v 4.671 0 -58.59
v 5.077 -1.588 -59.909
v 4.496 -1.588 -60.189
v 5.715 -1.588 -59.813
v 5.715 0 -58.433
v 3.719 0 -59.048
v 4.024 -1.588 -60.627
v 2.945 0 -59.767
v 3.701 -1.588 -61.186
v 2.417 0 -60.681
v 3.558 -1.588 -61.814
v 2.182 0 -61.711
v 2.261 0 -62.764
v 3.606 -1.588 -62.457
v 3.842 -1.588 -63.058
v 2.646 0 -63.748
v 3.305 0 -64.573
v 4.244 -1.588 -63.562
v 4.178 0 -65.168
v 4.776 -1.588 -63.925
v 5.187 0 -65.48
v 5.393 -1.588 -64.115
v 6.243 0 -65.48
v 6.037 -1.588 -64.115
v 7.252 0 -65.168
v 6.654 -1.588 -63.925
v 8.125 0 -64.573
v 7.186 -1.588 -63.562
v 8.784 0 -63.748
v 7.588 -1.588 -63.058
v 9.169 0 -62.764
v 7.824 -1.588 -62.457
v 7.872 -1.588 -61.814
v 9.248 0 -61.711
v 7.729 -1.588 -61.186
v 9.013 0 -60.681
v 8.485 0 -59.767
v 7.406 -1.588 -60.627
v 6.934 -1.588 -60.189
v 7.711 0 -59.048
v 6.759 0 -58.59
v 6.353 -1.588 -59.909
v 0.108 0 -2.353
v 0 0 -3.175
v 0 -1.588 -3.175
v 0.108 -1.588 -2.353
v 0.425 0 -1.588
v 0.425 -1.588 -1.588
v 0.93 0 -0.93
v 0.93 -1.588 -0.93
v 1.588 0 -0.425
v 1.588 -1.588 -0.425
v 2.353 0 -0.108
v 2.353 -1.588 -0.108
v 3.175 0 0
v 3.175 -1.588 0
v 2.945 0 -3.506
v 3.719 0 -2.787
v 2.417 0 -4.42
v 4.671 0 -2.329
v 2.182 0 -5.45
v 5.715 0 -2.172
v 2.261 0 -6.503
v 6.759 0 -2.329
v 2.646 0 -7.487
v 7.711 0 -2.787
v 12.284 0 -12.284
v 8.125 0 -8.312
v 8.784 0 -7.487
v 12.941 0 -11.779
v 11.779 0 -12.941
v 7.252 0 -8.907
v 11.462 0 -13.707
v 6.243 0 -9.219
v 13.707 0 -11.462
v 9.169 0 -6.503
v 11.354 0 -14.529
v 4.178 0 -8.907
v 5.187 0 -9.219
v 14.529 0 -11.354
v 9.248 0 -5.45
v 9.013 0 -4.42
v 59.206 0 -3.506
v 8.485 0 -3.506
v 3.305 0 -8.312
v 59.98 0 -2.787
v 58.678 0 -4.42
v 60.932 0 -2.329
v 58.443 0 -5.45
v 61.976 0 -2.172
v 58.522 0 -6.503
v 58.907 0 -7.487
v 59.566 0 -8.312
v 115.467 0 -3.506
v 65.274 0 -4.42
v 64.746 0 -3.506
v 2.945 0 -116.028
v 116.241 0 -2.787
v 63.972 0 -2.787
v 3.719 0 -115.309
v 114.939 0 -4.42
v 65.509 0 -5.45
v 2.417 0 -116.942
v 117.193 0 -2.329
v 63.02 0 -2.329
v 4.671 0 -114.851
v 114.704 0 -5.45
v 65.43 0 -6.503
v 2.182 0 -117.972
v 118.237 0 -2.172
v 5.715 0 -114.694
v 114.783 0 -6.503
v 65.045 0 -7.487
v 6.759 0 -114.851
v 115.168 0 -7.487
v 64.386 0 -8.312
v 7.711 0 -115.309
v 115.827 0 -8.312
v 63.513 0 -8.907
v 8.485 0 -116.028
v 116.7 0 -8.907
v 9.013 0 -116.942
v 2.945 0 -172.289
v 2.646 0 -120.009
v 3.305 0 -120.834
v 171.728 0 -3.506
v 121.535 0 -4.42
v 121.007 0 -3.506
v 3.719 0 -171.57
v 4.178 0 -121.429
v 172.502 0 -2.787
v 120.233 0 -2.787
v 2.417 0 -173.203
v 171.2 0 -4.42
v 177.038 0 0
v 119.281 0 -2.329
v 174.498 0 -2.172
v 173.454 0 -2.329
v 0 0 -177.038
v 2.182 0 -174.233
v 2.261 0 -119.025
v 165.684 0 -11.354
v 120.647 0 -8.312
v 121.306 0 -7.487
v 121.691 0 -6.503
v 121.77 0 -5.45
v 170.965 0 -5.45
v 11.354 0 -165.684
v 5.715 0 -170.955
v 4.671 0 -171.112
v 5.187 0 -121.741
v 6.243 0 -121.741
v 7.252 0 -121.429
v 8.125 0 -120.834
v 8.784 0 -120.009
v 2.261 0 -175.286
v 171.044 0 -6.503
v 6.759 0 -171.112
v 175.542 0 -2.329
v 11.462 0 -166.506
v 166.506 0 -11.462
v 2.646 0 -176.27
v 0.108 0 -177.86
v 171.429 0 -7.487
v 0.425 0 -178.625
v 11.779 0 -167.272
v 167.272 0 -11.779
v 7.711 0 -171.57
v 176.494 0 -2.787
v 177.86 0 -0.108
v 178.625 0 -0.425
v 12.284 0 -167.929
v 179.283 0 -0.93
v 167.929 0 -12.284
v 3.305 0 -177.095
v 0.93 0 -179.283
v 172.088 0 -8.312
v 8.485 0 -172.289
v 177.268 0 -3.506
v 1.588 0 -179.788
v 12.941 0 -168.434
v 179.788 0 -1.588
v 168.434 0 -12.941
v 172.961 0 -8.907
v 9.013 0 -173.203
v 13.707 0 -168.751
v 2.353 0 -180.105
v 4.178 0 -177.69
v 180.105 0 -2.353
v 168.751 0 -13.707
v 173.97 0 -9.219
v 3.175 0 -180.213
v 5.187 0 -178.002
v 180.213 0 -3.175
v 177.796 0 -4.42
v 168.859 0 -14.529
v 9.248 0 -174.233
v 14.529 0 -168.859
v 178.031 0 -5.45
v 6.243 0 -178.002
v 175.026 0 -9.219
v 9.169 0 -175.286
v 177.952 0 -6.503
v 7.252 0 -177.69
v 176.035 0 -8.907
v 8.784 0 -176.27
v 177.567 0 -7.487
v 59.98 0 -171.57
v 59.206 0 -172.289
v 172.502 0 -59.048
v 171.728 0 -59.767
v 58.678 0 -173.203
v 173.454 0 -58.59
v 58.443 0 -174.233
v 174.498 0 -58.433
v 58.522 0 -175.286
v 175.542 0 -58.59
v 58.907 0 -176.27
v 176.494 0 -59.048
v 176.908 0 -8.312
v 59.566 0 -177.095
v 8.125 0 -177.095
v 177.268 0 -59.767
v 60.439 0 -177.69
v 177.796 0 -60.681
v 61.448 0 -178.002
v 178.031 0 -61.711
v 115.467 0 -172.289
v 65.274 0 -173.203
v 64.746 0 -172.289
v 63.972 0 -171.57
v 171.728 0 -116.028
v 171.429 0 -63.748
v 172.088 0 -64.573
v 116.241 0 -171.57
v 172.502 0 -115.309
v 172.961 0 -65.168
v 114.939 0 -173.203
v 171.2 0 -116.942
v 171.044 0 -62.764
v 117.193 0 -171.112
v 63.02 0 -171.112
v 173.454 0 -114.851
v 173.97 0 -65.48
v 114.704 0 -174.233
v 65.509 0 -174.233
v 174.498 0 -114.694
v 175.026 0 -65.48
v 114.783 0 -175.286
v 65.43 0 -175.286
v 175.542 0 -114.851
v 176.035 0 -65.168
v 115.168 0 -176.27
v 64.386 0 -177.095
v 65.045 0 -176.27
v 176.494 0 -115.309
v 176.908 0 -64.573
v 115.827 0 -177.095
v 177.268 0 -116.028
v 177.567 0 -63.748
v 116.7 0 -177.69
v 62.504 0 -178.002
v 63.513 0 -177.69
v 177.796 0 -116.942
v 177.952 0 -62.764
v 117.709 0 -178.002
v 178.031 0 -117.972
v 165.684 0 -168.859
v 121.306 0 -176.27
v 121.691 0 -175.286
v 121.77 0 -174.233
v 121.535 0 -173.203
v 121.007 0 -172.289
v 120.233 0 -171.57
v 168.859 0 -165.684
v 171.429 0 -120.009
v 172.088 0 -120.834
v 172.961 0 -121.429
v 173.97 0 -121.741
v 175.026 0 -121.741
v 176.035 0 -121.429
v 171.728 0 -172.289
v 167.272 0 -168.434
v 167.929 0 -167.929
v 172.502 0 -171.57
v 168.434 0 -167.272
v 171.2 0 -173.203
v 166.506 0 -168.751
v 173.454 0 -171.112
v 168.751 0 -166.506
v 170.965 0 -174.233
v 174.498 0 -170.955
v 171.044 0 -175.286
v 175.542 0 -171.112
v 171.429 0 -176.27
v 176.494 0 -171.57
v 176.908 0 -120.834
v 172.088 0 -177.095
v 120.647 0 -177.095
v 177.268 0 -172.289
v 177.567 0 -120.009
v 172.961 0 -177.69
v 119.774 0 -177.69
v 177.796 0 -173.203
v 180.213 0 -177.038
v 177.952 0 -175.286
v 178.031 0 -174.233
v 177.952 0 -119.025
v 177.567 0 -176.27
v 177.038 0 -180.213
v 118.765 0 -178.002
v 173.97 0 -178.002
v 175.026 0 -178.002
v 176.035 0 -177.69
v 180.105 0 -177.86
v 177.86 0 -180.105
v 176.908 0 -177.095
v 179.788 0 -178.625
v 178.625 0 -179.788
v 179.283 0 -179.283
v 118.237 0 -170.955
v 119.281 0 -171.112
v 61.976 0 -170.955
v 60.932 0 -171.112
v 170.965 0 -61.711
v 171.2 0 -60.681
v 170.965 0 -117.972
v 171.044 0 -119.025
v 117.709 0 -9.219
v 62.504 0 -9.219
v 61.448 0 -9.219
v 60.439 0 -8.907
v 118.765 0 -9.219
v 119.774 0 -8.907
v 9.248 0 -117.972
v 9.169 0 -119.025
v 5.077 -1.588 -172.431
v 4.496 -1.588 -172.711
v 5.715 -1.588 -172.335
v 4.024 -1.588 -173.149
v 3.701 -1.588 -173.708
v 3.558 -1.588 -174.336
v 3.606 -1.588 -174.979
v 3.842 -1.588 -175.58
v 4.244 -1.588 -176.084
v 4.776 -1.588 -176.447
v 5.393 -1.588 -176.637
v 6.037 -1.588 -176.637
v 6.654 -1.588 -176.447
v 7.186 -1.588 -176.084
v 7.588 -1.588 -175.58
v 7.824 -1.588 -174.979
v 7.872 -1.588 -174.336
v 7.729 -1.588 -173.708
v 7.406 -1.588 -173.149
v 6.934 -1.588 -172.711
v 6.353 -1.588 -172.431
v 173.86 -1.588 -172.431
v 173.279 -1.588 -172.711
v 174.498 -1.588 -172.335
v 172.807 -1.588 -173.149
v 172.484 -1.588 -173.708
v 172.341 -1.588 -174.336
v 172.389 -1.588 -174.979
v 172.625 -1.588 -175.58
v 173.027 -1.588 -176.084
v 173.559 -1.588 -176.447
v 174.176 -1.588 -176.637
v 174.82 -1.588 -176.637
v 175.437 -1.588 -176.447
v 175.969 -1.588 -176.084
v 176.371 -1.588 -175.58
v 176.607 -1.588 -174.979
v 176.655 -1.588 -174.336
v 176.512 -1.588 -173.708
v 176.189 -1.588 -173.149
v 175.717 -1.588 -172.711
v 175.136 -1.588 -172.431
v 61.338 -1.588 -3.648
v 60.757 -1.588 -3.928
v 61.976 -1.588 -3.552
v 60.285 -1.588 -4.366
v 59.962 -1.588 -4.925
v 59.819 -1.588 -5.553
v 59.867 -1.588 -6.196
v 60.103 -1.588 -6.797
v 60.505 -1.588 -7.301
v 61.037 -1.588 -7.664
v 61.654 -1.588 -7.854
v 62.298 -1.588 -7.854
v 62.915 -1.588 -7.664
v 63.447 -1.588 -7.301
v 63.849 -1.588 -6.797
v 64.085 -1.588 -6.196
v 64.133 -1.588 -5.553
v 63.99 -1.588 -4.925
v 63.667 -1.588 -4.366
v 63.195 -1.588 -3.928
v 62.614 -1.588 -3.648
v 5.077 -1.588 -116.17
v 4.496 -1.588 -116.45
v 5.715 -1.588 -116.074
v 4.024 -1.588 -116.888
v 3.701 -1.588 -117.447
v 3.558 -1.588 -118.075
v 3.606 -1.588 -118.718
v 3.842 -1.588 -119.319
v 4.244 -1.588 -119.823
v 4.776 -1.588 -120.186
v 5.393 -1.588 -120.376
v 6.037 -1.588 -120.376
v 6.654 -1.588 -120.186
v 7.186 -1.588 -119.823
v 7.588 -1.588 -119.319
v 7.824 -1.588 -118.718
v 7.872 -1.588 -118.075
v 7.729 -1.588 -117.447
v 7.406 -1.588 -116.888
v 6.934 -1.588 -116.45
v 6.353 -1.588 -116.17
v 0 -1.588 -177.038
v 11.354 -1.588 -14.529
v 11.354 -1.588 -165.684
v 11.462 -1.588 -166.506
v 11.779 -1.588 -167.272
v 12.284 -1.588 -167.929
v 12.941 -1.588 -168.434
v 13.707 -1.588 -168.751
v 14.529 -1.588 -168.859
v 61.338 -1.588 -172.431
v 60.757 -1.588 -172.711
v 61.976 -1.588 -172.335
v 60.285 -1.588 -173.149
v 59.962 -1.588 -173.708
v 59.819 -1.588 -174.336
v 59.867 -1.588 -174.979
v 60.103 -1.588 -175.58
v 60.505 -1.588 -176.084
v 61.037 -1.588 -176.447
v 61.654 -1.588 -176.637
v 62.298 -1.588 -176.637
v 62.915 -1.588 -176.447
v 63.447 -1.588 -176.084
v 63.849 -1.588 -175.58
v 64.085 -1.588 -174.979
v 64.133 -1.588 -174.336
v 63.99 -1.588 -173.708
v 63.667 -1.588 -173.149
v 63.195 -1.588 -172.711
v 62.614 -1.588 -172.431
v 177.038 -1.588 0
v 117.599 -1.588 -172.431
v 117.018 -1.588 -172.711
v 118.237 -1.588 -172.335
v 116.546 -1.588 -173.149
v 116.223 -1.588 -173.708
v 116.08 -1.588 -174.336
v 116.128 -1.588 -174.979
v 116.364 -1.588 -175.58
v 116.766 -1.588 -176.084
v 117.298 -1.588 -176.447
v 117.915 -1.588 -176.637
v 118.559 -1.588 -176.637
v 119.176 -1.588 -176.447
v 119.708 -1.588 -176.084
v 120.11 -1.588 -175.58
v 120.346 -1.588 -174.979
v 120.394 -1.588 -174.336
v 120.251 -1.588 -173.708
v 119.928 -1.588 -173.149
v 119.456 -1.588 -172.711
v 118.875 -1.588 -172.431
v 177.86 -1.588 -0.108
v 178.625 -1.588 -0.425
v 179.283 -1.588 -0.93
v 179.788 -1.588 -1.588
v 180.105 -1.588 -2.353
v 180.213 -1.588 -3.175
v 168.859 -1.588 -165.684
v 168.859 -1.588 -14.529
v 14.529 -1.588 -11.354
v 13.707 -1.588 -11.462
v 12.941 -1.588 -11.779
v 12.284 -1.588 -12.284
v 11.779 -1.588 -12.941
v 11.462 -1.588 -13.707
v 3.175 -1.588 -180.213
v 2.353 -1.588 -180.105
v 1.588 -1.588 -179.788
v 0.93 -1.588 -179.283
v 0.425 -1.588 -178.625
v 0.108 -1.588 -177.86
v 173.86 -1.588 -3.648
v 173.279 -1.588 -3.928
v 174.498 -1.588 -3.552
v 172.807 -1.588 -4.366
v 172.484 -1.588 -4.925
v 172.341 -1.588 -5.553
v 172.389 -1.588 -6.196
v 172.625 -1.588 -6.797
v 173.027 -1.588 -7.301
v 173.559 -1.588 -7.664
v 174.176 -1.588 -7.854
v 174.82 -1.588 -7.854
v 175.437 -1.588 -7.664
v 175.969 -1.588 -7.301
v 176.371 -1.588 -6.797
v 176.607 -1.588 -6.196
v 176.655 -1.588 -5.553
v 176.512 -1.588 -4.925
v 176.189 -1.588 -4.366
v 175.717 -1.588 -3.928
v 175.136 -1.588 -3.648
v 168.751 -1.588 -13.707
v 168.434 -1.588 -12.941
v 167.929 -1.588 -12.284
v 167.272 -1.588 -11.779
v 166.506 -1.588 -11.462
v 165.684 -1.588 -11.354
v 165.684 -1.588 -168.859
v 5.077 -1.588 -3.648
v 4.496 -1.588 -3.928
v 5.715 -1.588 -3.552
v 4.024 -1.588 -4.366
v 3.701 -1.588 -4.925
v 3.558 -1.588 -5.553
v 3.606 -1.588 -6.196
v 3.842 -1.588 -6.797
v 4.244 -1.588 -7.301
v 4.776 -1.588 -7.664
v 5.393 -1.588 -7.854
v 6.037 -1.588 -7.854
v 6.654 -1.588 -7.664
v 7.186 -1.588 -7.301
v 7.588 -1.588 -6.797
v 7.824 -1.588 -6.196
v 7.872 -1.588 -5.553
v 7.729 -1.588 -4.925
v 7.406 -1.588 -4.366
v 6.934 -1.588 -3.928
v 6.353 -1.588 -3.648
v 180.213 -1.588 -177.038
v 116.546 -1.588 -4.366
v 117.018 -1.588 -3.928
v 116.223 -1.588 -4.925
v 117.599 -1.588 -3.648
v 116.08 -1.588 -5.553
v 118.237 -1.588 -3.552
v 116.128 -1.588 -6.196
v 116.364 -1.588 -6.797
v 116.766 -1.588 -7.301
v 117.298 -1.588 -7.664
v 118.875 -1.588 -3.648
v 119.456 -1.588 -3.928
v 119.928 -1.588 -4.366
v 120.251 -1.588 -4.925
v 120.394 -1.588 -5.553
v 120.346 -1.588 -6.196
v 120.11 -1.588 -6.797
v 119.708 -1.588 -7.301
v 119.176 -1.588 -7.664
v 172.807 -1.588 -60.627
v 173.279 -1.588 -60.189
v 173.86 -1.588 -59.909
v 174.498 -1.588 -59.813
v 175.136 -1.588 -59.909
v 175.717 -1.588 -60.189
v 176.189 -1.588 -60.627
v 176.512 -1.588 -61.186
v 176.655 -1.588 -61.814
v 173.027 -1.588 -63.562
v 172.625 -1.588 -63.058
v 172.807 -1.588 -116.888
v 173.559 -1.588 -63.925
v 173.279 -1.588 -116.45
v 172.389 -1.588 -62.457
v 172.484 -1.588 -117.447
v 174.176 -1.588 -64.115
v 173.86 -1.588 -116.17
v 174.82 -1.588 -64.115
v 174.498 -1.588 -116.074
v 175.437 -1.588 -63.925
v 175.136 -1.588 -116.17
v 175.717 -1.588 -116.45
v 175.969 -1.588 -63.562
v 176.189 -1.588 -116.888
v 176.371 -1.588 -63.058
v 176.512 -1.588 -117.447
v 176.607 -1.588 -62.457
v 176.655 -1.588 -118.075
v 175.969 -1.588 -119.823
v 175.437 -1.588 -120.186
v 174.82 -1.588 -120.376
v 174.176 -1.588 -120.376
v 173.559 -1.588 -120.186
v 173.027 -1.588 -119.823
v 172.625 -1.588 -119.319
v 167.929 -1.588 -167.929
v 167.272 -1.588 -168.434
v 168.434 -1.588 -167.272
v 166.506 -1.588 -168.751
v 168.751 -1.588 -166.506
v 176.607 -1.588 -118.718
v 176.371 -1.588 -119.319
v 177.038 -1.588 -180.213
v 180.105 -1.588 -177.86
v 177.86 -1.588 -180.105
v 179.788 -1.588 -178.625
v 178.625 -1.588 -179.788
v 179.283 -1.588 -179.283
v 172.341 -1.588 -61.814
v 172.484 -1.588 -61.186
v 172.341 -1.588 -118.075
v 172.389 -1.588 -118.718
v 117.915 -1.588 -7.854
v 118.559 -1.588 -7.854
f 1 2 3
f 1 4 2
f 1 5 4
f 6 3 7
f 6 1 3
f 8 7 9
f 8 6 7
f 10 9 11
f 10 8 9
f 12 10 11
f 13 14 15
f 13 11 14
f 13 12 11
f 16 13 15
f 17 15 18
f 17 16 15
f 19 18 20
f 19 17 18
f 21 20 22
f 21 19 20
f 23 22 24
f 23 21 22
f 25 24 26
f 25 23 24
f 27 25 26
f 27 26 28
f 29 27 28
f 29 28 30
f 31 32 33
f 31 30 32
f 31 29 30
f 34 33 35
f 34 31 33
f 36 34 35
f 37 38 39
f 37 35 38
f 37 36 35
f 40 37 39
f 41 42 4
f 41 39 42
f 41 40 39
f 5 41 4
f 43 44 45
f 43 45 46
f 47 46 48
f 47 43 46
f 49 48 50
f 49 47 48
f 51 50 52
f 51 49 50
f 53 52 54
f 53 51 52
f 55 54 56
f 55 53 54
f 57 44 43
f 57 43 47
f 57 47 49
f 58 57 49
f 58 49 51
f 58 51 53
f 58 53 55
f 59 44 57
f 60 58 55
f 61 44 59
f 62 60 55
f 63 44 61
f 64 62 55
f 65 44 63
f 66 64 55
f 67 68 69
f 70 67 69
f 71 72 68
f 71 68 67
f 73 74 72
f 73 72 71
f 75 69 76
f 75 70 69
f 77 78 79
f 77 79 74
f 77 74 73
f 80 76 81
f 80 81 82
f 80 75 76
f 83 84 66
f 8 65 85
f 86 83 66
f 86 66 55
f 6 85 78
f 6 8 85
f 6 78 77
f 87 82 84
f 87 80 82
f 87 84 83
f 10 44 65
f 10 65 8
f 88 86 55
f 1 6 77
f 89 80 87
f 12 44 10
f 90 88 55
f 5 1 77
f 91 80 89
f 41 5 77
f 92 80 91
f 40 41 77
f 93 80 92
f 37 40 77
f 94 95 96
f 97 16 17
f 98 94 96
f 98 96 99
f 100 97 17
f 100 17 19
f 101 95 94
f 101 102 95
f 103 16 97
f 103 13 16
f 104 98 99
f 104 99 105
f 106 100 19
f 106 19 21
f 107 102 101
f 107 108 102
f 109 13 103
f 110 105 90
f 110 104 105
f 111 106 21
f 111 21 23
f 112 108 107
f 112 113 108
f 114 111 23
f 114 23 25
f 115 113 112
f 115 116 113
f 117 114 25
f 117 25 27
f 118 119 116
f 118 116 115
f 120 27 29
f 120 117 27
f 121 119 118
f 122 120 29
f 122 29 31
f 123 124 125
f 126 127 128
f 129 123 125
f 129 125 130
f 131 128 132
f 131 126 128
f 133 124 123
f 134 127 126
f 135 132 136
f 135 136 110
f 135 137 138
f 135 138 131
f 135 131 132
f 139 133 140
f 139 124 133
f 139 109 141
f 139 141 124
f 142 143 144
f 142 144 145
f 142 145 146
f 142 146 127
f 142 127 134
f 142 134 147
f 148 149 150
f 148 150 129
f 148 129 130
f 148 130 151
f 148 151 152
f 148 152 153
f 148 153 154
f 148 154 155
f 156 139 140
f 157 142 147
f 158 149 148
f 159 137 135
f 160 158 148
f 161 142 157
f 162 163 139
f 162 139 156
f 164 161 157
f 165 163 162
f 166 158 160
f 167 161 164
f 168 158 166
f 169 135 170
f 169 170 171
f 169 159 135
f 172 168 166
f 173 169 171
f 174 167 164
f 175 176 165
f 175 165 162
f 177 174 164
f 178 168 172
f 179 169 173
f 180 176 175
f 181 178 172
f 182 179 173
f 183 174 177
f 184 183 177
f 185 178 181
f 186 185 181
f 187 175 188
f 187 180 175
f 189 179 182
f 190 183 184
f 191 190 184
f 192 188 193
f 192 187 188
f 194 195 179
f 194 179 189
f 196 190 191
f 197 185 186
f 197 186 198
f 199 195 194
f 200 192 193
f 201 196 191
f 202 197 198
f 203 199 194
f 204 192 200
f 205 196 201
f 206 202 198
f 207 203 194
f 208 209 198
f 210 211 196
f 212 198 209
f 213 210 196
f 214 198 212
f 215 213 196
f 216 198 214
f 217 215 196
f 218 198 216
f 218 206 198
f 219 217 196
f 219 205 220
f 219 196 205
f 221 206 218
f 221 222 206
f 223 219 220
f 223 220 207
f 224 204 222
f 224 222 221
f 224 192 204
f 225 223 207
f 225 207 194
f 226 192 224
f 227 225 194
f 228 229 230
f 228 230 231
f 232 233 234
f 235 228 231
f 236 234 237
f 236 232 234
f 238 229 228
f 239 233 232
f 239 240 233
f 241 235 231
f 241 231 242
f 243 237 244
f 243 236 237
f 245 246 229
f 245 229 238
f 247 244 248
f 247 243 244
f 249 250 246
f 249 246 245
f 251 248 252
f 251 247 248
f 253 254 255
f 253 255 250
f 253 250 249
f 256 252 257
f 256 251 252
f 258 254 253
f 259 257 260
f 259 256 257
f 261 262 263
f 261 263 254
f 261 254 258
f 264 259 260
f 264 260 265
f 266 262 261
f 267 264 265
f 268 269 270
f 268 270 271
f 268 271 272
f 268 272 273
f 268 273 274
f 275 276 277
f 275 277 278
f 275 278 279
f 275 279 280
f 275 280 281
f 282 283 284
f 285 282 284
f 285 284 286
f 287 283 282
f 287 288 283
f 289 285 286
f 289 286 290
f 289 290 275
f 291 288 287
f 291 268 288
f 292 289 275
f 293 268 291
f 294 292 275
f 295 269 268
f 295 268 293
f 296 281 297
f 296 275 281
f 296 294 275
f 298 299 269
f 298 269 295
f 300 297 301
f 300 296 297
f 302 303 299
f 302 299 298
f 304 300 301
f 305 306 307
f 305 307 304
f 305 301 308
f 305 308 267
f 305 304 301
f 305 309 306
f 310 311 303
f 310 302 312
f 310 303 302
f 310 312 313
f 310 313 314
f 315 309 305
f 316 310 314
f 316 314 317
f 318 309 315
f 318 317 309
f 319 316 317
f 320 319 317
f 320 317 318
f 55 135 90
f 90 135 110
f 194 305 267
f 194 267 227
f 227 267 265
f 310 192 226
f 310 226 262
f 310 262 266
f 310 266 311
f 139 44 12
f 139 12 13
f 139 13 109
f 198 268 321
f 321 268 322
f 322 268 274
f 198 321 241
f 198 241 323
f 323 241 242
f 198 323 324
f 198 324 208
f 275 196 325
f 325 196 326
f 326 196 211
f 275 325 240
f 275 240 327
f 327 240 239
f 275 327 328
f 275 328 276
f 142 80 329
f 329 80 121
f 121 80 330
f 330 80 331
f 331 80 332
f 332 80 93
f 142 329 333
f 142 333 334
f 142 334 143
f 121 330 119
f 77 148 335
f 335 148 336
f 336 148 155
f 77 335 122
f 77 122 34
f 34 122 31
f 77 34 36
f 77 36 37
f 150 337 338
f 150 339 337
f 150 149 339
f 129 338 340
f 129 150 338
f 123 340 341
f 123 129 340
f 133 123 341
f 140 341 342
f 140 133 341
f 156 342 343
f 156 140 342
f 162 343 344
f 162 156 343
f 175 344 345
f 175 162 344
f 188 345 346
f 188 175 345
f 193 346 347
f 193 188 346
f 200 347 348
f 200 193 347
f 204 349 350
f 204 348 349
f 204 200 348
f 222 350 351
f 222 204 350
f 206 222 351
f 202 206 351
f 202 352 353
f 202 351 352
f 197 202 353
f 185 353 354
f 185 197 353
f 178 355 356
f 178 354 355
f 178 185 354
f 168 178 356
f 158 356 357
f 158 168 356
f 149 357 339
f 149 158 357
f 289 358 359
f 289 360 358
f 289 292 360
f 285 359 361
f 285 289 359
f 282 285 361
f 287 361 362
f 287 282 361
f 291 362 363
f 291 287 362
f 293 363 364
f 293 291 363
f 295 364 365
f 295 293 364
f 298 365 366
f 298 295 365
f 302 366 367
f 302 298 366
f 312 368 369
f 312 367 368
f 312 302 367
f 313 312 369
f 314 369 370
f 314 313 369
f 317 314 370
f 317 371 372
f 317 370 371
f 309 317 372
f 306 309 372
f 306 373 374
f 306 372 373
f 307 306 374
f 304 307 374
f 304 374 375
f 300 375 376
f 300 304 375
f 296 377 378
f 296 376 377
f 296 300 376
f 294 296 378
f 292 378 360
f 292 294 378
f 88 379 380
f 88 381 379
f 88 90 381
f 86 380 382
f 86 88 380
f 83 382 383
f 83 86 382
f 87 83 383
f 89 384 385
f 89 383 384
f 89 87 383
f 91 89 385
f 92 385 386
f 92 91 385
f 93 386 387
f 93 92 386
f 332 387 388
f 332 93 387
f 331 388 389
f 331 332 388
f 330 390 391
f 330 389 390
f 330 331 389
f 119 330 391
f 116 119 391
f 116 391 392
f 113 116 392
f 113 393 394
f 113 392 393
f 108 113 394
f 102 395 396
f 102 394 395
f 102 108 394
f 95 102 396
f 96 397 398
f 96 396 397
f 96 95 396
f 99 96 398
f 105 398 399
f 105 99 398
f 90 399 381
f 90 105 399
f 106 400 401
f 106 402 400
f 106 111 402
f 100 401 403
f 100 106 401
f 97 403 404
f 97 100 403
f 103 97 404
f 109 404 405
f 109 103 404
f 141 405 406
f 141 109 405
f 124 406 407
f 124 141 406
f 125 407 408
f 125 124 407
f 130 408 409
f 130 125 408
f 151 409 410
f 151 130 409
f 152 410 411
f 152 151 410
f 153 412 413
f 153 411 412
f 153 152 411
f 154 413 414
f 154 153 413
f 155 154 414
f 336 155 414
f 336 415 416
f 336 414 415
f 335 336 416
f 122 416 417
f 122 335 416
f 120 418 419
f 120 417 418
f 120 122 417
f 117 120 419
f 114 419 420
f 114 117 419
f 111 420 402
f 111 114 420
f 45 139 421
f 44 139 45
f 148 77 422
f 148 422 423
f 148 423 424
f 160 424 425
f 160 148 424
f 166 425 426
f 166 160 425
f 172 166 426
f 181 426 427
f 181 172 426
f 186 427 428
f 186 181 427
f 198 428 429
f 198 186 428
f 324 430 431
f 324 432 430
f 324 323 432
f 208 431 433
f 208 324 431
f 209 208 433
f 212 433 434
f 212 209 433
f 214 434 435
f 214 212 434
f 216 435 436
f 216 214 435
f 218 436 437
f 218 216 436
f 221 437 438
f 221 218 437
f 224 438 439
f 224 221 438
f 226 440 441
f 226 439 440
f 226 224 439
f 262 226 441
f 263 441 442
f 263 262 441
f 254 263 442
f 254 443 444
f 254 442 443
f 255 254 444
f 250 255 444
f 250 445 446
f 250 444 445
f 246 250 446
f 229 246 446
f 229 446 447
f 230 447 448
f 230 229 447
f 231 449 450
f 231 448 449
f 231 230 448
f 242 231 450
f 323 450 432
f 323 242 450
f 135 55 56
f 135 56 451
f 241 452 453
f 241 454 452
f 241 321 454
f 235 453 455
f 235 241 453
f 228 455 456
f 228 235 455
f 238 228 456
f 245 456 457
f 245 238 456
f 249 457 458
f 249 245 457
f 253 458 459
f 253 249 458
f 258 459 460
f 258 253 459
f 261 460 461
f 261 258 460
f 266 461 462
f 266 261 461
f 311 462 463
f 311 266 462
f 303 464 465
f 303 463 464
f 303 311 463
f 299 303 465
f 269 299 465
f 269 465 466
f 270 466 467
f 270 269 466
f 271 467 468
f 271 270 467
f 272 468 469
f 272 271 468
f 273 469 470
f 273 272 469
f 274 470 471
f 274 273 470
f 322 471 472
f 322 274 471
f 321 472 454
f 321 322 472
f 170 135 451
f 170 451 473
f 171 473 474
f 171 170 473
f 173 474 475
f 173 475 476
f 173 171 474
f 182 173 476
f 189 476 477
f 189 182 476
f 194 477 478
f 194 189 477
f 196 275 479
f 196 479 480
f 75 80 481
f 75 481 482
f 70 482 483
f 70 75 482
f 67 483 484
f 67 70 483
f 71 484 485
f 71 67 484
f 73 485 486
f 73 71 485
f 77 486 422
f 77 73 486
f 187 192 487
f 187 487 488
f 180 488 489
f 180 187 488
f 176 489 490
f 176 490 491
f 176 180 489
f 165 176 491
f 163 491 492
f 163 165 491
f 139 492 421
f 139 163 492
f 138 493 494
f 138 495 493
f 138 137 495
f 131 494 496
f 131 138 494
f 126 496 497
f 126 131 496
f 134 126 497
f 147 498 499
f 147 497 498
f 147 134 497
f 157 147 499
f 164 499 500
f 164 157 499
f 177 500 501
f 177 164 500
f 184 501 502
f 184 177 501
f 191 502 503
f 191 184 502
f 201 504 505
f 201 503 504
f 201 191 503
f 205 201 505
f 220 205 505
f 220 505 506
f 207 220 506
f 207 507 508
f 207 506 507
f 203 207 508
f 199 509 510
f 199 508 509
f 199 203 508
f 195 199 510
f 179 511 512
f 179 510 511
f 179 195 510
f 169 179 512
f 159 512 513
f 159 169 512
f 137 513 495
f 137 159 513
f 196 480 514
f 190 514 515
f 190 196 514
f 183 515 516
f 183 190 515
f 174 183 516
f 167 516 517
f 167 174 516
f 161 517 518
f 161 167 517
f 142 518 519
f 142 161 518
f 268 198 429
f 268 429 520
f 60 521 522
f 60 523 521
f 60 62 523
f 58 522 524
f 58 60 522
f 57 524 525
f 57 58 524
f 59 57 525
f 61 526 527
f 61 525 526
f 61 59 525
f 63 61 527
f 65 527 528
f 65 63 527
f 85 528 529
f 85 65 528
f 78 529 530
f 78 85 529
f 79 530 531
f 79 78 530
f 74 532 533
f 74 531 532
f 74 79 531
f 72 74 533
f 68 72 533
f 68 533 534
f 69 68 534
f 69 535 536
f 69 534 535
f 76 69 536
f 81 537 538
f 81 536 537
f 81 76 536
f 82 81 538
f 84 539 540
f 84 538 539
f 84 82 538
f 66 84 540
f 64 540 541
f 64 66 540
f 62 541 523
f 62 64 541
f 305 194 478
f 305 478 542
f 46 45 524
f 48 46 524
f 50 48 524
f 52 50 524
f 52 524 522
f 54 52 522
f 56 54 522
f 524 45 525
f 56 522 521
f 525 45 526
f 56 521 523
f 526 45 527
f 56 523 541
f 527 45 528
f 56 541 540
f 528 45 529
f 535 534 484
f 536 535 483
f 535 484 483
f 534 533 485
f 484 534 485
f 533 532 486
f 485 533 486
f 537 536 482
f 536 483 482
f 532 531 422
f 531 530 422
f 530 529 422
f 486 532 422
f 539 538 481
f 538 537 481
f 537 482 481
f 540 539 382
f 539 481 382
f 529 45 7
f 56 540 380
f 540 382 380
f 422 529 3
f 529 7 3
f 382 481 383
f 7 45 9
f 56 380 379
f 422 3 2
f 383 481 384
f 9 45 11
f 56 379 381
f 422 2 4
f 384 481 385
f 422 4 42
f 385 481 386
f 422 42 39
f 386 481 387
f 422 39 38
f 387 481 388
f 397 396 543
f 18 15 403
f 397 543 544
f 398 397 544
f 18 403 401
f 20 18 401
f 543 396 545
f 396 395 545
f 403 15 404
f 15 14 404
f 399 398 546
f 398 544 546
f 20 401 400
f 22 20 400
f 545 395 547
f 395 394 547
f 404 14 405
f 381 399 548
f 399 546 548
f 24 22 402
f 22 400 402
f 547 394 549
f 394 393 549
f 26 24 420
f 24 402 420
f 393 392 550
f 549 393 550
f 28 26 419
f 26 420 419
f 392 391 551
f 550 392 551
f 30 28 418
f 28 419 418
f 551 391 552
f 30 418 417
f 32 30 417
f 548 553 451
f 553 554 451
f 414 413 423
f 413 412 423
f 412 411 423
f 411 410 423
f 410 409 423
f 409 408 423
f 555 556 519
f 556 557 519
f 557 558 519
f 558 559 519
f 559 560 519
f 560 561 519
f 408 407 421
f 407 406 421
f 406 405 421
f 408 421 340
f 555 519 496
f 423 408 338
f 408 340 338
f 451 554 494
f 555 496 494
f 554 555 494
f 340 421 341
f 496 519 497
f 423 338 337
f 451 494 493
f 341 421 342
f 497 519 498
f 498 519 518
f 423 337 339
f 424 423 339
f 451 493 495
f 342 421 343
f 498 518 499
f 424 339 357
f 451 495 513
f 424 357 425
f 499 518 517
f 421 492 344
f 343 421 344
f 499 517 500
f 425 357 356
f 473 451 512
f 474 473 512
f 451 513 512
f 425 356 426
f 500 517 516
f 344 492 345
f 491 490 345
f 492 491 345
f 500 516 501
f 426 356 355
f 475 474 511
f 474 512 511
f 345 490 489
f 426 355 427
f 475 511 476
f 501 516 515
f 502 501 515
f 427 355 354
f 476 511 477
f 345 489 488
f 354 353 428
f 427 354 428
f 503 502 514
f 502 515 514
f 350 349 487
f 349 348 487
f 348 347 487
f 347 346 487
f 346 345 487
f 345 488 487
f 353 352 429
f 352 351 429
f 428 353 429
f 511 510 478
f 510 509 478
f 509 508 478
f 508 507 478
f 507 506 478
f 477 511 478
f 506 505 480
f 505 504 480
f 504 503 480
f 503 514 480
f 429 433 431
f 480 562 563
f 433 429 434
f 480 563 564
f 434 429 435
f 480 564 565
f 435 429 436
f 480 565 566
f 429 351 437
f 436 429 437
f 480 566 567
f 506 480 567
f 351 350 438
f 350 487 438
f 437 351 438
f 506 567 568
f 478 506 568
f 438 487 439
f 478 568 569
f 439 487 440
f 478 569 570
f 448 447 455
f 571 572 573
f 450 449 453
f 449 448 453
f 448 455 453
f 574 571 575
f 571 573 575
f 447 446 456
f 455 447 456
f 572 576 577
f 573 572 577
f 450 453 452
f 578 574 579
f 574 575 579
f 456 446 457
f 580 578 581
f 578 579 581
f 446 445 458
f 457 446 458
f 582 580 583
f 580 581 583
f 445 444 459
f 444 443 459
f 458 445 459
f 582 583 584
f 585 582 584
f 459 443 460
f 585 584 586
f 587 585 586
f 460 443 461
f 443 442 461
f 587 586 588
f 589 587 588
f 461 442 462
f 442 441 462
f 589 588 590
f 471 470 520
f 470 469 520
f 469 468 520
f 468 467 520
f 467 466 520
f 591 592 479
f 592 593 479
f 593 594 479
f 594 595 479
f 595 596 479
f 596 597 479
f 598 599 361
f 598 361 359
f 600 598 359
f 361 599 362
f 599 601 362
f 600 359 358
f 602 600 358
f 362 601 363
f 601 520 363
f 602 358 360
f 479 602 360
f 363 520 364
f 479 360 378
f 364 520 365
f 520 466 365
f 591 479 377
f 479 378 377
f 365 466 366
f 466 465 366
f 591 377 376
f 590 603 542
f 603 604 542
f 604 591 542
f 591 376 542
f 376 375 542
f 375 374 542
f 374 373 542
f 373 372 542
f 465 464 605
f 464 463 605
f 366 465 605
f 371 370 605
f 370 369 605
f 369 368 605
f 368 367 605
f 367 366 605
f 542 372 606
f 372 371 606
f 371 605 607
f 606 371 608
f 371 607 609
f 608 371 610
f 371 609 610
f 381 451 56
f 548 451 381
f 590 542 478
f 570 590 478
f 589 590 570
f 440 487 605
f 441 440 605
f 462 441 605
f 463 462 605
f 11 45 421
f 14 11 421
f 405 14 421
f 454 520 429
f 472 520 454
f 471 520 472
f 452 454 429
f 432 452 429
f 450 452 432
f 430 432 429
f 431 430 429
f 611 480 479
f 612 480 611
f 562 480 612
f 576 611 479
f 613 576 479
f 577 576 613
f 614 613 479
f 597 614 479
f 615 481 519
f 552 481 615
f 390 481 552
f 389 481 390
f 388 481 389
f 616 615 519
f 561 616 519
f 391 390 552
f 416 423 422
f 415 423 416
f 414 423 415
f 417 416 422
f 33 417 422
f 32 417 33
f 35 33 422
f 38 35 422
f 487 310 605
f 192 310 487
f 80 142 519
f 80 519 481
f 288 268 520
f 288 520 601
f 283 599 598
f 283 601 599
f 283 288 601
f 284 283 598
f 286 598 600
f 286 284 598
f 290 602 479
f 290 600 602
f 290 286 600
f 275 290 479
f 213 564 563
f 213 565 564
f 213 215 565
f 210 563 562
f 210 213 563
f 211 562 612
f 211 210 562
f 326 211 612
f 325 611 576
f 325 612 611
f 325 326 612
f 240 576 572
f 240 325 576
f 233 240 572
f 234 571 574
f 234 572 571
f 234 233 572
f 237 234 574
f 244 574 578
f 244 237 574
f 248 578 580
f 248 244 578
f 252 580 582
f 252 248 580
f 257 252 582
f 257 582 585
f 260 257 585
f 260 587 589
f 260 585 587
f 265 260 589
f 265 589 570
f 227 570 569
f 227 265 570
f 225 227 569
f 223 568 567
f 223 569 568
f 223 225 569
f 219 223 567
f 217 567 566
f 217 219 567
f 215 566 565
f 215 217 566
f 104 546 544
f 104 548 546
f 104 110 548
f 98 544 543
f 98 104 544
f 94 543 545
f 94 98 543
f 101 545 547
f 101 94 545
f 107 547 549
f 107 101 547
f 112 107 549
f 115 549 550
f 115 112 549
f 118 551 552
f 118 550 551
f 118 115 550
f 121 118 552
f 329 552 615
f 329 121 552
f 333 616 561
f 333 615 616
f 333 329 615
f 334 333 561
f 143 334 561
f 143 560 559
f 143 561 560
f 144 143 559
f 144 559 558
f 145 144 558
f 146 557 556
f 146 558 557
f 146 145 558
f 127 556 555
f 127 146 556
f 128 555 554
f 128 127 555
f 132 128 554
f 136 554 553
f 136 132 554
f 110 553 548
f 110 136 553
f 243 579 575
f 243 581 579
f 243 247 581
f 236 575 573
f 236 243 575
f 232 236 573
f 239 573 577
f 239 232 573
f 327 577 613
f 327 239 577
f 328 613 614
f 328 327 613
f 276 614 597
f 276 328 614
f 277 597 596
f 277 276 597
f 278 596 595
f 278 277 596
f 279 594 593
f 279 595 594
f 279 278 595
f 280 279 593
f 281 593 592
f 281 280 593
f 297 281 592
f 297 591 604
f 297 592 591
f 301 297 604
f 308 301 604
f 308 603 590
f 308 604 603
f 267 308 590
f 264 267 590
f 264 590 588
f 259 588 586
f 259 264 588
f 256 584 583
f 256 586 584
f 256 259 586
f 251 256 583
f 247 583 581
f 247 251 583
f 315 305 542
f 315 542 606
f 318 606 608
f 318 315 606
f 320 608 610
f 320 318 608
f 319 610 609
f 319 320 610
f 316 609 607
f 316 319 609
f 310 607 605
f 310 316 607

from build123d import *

# Parameters (mm, degrees)
BASE_FLANGE1_DEPTH                            = 1.5875
CUT_EXTRUDE1_DEPTH                            = 255.864612872
CSK_FOR_6_FLAT_HEAD_MACHINE_SCREW1_AT_2_COUNT = 2
CSK_FOR_6_FLAT_HEAD_MACHINE_SCREW1_AT_2_PITCH = 56.261
CSK_FOR_6_FLAT_HEAD_MACHINE_SCREW1_AT_3_COUNT = 2
CSK_FOR_6_FLAT_HEAD_MACHINE_SCREW1_AT_3_PITCH = 177.912903439
CSK_FOR_6_FLAT_HEAD_MACHINE_SCREW1_AT_4_COUNT = 2
CSK_FOR_6_FLAT_HEAD_MACHINE_SCREW1_AT_4_PITCH = 168.783
CSK_FOR_6_FLAT_HEAD_MACHINE_SCREW1_AT_5_COUNT = 2
CSK_FOR_6_FLAT_HEAD_MACHINE_SCREW1_AT_5_PITCH = 112.522
CSK_FOR_6_FLAT_HEAD_MACHINE_SCREW1_AT_6_COUNT = 2
CSK_FOR_6_FLAT_HEAD_MACHINE_SCREW1_AT_6_PITCH = 56.261
CSK_FOR_6_FLAT_HEAD_MACHINE_SCREW1_AT_7_COUNT = 2
CSK_FOR_6_FLAT_HEAD_MACHINE_SCREW1_AT_7_PITCH = 112.522
CSK_FOR_6_FLAT_HEAD_MACHINE_SCREW1_AT_8_COUNT = 2
CSK_FOR_6_FLAT_HEAD_MACHINE_SCREW1_AT_8_PITCH = 168.783
CSK_FOR_6_FLAT_HEAD_MACHINE_SCREW1_AT_9_COUNT = 2
CSK_FOR_6_FLAT_HEAD_MACHINE_SCREW1_AT_9_PITCH = 177.912903439
CSK_FOR_6_FLAT_HEAD_MACHINE_SCREW1_AT_1_COUNT = 2
CSK_FOR_6_FLAT_HEAD_MACHINE_SCREW1_AT_1_PITCH = 202.851920309
CSK_FOR_6_FLAT_HEAD_MACHINE_SCREW1_2_COUNT    = 2
CSK_FOR_6_FLAT_HEAD_MACHINE_SCREW1_2_PITCH    = 202.851920309
CSK_FOR_6_FLAT_HEAD_MACHINE_SCREW1_3_COUNT    = 2
CSK_FOR_6_FLAT_HEAD_MACHINE_SCREW1_3_PITCH    = 238.695207698


# Sheet-metal steps are written as plain solids
with BuildPart() as part:
    # Sketch2 → Base-Flange1 (new body)
    with BuildSketch(Plane(origin=(0, 0, 0), x_dir=(1, 0, 0), z_dir=(0, 1, 0))):
        with BuildLine():
            Line((3.175, 0), (177.038, 0))
            ThreePointArc((177.038, 0), (179.28306403, 0.92993597), (180.213, 3.175))
            Line((180.213, 3.175), (180.213, 177.038))
            ThreePointArc((180.213, 177.038), (179.28306403, 179.28306403), (177.038, 180.213))
            Line((177.038, 180.213), (3.175, 180.213))
            ThreePointArc((3.175, 180.213), (0.92993597, 179.28306403), (0, 177.038))
            Line((0, 177.038), (0, 3.175))
            ThreePointArc((0, 3.175), (0.92993597, 0.92993597), (3.175, 0))
        make_face()
    extrude(amount=-BASE_FLANGE1_DEPTH)

    # Sketch7 → Cut-Extrude1 (cut, through all)
    with BuildSketch(Plane(origin=(0, 0, 0), x_dir=(1, 0, 0), z_dir=(0, 1, 0))):
        with BuildLine():
            Line((14.5288, 168.8592), (165.6842, 168.8592))
            ThreePointArc((165.6842, 168.8592), (167.92926403, 167.92926403), (168.8592, 165.6842))
            Line((168.8592, 165.6842), (168.8592, 14.5288))
            ThreePointArc((168.8592, 14.5288), (167.92926403, 12.28373597), (165.6842, 11.3538))
            Line((165.6842, 11.3538), (14.5288, 11.3538))
            ThreePointArc((14.5288, 11.3538), (12.28373597, 12.28373597), (11.3538, 14.5288))
            Line((11.3538, 14.5288), (11.3538, 165.6842))
            ThreePointArc((11.3538, 165.6842), (12.28373597, 167.92926403), (14.5288, 168.8592))
        make_face()
    extrude(amount=-CUT_EXTRUDE1_DEPTH, mode=Mode.SUBTRACT)

    # Sketch8 → CSK for #6 Flat Head Machine Screw1 (revolve, cut)
    with BuildSketch(Plane(origin=(5.715, 0, -174.4979492), x_dir=(0, 0, 1), z_dir=(1, 0, 0))):
        Polygon((0, 0), (0, 1.5875), (1.8288, 1.5875), (1.8288, 1.972306634), (3.5433, 0), align=None)
    csk_for_6_flat_head_machine_screw1 = revolve(axis=Axis((5.715, 6.35, -174.4979492), (0, -1, 0)), mode=Mode.SUBTRACT)

    # CSK for #6 Flat Head Machine Screw1 at 2: CSK for #6 Flat Head Machine Screw1 ×2
    with Locations(*[(i * CSK_FOR_6_FLAT_HEAD_MACHINE_SCREW1_AT_2_PITCH, 0, 0) for i in range(1, CSK_FOR_6_FLAT_HEAD_MACHINE_SCREW1_AT_2_COUNT)]):
        add(csk_for_6_flat_head_machine_screw1, mode=Mode.SUBTRACT)

    # CSK for #6 Flat Head Machine Screw1 at 3: CSK for #6 Flat Head Machine Screw1 ×2
    with Locations(*[Vector(0.3162277660168381, 0, 0.9486832980505138) * (i * CSK_FOR_6_FLAT_HEAD_MACHINE_SCREW1_AT_3_PITCH) for i in range(1, CSK_FOR_6_FLAT_HEAD_MACHINE_SCREW1_AT_3_COUNT)]):
        add(csk_for_6_flat_head_machine_screw1, mode=Mode.SUBTRACT)

    # CSK for #6 Flat Head Machine Screw1 at 4: CSK for #6 Flat Head Machine Screw1 ×2
    with Locations(*[(0, 0, i * CSK_FOR_6_FLAT_HEAD_MACHINE_SCREW1_AT_4_PITCH) for i in range(1, CSK_FOR_6_FLAT_HEAD_MACHINE_SCREW1_AT_4_COUNT)]):
        add(csk_for_6_flat_head_machine_screw1, mode=Mode.SUBTRACT)

    # CSK for #6 Flat Head Machine Screw1 at 5: CSK for #6 Flat Head Machine Screw1 ×2
    with Locations(*[(0, 0, i * CSK_FOR_6_FLAT_HEAD_MACHINE_SCREW1_AT_5_PITCH) for i in range(1, CSK_FOR_6_FLAT_HEAD_MACHINE_SCREW1_AT_5_COUNT)]):
        add(csk_for_6_flat_head_machine_screw1, mode=Mode.SUBTRACT)

    # CSK for #6 Flat Head Machine Screw1 at 6: CSK for #6 Flat Head Machine Screw1 ×2
    with Locations(*[(0, 0, i * CSK_FOR_6_FLAT_HEAD_MACHINE_SCREW1_AT_6_PITCH) for i in range(1, CSK_FOR_6_FLAT_HEAD_MACHINE_SCREW1_AT_6_COUNT)]):
        add(csk_for_6_flat_head_machine_screw1, mode=Mode.SUBTRACT)

    # CSK for #6 Flat Head Machine Screw1 at 7: CSK for #6 Flat Head Machine Screw1 ×2
    with Locations(*[(i * CSK_FOR_6_FLAT_HEAD_MACHINE_SCREW1_AT_7_PITCH, 0, 0) for i in range(1, CSK_FOR_6_FLAT_HEAD_MACHINE_SCREW1_AT_7_COUNT)]):
        add(csk_for_6_flat_head_machine_screw1, mode=Mode.SUBTRACT)

    # CSK for #6 Flat Head Machine Screw1 at 8: CSK for #6 Flat Head Machine Screw1 ×2
    with Locations(*[(i * CSK_FOR_6_FLAT_HEAD_MACHINE_SCREW1_AT_8_PITCH, 0, 0) for i in range(1, CSK_FOR_6_FLAT_HEAD_MACHINE_SCREW1_AT_8_COUNT)]):
        add(csk_for_6_flat_head_machine_screw1, mode=Mode.SUBTRACT)

    # CSK for #6 Flat Head Machine Screw1 at 9: CSK for #6 Flat Head Machine Screw1 ×2
    with Locations(*[Vector(0.9486832980505139, 0, 0.31622776601683783) * (i * CSK_FOR_6_FLAT_HEAD_MACHINE_SCREW1_AT_9_PITCH) for i in range(1, CSK_FOR_6_FLAT_HEAD_MACHINE_SCREW1_AT_9_COUNT)]):
        add(csk_for_6_flat_head_machine_screw1, mode=Mode.SUBTRACT)

    # CSK for #6 Flat Head Machine Screw1 at 1: CSK for #6 Flat Head Machine Screw1 ×2
    with Locations(*[Vector(0.8320502943378437, 0, 0.5547001962252291) * (i * CSK_FOR_6_FLAT_HEAD_MACHINE_SCREW1_AT_1_PITCH) for i in range(1, CSK_FOR_6_FLAT_HEAD_MACHINE_SCREW1_AT_1_COUNT)]):
        add(csk_for_6_flat_head_machine_screw1, mode=Mode.SUBTRACT)

    # CSK for #6 Flat Head Machine Screw1  2: CSK for #6 Flat Head Machine Screw1 ×2
    with Locations(*[Vector(0.5547001962252293, 0, 0.8320502943378436) * (i * CSK_FOR_6_FLAT_HEAD_MACHINE_SCREW1_2_PITCH) for i in range(1, CSK_FOR_6_FLAT_HEAD_MACHINE_SCREW1_2_COUNT)]):
        add(csk_for_6_flat_head_machine_screw1, mode=Mode.SUBTRACT)

    # CSK for #6 Flat Head Machine Screw1  3: CSK for #6 Flat Head Machine Screw1 ×2
    with Locations(*[Vector(0.7071067811865477, 0, 0.7071067811865475) * (i * CSK_FOR_6_FLAT_HEAD_MACHINE_SCREW1_3_PITCH) for i in range(1, CSK_FOR_6_FLAT_HEAD_MACHINE_SCREW1_3_COUNT)]):
        add(csk_for_6_flat_head_machine_screw1, mode=Mode.SUBTRACT)


solid = part.part
